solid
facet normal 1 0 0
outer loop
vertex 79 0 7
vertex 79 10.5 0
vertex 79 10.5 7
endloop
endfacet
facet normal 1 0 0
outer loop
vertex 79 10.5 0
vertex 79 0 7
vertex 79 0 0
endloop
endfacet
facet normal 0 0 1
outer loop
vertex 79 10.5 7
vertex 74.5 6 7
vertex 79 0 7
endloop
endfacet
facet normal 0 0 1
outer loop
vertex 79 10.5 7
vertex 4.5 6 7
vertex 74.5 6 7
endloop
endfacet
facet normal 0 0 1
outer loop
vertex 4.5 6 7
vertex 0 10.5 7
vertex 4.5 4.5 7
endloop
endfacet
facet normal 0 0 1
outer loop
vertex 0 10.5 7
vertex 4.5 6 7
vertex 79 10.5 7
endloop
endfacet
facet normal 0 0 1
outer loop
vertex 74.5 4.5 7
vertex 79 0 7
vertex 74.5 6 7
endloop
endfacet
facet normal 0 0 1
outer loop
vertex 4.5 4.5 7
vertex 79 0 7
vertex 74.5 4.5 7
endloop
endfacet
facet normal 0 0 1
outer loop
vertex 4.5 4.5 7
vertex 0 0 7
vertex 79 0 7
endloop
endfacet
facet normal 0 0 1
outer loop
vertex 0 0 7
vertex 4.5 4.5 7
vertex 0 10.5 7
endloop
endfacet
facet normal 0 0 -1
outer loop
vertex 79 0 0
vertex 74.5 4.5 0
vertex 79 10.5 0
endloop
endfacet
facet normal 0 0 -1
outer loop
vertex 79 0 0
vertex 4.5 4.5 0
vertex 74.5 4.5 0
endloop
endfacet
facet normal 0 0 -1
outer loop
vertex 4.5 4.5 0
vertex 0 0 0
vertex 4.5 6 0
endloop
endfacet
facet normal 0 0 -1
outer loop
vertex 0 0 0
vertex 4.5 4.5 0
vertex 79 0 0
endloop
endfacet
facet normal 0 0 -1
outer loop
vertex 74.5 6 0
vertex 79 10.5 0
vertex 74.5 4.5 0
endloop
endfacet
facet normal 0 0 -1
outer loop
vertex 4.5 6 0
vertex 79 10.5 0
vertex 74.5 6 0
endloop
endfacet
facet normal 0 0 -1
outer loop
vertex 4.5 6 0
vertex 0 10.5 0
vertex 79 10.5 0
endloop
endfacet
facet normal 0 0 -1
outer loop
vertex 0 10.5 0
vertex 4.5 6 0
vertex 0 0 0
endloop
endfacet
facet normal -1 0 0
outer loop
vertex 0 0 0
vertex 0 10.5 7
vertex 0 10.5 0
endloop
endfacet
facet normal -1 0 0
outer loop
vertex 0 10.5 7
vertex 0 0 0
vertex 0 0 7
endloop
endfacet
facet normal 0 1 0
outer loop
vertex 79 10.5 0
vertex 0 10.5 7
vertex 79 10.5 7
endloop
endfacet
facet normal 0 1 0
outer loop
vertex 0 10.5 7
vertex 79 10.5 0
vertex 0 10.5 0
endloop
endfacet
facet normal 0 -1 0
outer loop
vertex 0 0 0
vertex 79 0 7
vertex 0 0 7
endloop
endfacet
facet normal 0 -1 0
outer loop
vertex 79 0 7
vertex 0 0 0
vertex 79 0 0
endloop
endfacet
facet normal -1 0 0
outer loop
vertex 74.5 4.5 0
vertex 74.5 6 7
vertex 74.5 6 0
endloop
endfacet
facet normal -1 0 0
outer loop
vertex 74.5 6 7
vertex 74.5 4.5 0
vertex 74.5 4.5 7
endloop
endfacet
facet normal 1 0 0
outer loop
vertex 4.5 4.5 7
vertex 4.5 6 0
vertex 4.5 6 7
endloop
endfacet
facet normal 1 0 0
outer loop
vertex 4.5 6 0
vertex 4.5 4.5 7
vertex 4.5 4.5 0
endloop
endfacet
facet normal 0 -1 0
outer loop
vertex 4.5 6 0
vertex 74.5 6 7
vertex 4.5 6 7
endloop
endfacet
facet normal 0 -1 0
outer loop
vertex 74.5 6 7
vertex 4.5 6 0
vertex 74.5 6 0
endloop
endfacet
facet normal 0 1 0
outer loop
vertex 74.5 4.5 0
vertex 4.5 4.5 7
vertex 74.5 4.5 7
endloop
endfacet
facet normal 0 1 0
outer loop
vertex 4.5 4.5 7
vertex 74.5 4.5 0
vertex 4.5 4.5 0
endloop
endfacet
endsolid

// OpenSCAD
// simple squeezing utility for these Hello Fresh sauce packets
//
// SPDX-FileCopyrightText: 2023 Georg Gadinger <nilsding@nilsding.org>
// SPDX-License-Identifier: CC-BY-NC-SA-4.0

// an usual packet is less than 7cm wide
width = 70;
// 1.5mm should be enough to fit a packet
hole_width = 1.5;
height = 7;
margin = 3;

difference() {
  cube([width + margin * 3, margin * 3 + hole_width, height]);
  translate([margin * 3 / 2, margin * 3 / 2, -(height / 2)])
  cube([width, hole_width, height * 2]);
}
